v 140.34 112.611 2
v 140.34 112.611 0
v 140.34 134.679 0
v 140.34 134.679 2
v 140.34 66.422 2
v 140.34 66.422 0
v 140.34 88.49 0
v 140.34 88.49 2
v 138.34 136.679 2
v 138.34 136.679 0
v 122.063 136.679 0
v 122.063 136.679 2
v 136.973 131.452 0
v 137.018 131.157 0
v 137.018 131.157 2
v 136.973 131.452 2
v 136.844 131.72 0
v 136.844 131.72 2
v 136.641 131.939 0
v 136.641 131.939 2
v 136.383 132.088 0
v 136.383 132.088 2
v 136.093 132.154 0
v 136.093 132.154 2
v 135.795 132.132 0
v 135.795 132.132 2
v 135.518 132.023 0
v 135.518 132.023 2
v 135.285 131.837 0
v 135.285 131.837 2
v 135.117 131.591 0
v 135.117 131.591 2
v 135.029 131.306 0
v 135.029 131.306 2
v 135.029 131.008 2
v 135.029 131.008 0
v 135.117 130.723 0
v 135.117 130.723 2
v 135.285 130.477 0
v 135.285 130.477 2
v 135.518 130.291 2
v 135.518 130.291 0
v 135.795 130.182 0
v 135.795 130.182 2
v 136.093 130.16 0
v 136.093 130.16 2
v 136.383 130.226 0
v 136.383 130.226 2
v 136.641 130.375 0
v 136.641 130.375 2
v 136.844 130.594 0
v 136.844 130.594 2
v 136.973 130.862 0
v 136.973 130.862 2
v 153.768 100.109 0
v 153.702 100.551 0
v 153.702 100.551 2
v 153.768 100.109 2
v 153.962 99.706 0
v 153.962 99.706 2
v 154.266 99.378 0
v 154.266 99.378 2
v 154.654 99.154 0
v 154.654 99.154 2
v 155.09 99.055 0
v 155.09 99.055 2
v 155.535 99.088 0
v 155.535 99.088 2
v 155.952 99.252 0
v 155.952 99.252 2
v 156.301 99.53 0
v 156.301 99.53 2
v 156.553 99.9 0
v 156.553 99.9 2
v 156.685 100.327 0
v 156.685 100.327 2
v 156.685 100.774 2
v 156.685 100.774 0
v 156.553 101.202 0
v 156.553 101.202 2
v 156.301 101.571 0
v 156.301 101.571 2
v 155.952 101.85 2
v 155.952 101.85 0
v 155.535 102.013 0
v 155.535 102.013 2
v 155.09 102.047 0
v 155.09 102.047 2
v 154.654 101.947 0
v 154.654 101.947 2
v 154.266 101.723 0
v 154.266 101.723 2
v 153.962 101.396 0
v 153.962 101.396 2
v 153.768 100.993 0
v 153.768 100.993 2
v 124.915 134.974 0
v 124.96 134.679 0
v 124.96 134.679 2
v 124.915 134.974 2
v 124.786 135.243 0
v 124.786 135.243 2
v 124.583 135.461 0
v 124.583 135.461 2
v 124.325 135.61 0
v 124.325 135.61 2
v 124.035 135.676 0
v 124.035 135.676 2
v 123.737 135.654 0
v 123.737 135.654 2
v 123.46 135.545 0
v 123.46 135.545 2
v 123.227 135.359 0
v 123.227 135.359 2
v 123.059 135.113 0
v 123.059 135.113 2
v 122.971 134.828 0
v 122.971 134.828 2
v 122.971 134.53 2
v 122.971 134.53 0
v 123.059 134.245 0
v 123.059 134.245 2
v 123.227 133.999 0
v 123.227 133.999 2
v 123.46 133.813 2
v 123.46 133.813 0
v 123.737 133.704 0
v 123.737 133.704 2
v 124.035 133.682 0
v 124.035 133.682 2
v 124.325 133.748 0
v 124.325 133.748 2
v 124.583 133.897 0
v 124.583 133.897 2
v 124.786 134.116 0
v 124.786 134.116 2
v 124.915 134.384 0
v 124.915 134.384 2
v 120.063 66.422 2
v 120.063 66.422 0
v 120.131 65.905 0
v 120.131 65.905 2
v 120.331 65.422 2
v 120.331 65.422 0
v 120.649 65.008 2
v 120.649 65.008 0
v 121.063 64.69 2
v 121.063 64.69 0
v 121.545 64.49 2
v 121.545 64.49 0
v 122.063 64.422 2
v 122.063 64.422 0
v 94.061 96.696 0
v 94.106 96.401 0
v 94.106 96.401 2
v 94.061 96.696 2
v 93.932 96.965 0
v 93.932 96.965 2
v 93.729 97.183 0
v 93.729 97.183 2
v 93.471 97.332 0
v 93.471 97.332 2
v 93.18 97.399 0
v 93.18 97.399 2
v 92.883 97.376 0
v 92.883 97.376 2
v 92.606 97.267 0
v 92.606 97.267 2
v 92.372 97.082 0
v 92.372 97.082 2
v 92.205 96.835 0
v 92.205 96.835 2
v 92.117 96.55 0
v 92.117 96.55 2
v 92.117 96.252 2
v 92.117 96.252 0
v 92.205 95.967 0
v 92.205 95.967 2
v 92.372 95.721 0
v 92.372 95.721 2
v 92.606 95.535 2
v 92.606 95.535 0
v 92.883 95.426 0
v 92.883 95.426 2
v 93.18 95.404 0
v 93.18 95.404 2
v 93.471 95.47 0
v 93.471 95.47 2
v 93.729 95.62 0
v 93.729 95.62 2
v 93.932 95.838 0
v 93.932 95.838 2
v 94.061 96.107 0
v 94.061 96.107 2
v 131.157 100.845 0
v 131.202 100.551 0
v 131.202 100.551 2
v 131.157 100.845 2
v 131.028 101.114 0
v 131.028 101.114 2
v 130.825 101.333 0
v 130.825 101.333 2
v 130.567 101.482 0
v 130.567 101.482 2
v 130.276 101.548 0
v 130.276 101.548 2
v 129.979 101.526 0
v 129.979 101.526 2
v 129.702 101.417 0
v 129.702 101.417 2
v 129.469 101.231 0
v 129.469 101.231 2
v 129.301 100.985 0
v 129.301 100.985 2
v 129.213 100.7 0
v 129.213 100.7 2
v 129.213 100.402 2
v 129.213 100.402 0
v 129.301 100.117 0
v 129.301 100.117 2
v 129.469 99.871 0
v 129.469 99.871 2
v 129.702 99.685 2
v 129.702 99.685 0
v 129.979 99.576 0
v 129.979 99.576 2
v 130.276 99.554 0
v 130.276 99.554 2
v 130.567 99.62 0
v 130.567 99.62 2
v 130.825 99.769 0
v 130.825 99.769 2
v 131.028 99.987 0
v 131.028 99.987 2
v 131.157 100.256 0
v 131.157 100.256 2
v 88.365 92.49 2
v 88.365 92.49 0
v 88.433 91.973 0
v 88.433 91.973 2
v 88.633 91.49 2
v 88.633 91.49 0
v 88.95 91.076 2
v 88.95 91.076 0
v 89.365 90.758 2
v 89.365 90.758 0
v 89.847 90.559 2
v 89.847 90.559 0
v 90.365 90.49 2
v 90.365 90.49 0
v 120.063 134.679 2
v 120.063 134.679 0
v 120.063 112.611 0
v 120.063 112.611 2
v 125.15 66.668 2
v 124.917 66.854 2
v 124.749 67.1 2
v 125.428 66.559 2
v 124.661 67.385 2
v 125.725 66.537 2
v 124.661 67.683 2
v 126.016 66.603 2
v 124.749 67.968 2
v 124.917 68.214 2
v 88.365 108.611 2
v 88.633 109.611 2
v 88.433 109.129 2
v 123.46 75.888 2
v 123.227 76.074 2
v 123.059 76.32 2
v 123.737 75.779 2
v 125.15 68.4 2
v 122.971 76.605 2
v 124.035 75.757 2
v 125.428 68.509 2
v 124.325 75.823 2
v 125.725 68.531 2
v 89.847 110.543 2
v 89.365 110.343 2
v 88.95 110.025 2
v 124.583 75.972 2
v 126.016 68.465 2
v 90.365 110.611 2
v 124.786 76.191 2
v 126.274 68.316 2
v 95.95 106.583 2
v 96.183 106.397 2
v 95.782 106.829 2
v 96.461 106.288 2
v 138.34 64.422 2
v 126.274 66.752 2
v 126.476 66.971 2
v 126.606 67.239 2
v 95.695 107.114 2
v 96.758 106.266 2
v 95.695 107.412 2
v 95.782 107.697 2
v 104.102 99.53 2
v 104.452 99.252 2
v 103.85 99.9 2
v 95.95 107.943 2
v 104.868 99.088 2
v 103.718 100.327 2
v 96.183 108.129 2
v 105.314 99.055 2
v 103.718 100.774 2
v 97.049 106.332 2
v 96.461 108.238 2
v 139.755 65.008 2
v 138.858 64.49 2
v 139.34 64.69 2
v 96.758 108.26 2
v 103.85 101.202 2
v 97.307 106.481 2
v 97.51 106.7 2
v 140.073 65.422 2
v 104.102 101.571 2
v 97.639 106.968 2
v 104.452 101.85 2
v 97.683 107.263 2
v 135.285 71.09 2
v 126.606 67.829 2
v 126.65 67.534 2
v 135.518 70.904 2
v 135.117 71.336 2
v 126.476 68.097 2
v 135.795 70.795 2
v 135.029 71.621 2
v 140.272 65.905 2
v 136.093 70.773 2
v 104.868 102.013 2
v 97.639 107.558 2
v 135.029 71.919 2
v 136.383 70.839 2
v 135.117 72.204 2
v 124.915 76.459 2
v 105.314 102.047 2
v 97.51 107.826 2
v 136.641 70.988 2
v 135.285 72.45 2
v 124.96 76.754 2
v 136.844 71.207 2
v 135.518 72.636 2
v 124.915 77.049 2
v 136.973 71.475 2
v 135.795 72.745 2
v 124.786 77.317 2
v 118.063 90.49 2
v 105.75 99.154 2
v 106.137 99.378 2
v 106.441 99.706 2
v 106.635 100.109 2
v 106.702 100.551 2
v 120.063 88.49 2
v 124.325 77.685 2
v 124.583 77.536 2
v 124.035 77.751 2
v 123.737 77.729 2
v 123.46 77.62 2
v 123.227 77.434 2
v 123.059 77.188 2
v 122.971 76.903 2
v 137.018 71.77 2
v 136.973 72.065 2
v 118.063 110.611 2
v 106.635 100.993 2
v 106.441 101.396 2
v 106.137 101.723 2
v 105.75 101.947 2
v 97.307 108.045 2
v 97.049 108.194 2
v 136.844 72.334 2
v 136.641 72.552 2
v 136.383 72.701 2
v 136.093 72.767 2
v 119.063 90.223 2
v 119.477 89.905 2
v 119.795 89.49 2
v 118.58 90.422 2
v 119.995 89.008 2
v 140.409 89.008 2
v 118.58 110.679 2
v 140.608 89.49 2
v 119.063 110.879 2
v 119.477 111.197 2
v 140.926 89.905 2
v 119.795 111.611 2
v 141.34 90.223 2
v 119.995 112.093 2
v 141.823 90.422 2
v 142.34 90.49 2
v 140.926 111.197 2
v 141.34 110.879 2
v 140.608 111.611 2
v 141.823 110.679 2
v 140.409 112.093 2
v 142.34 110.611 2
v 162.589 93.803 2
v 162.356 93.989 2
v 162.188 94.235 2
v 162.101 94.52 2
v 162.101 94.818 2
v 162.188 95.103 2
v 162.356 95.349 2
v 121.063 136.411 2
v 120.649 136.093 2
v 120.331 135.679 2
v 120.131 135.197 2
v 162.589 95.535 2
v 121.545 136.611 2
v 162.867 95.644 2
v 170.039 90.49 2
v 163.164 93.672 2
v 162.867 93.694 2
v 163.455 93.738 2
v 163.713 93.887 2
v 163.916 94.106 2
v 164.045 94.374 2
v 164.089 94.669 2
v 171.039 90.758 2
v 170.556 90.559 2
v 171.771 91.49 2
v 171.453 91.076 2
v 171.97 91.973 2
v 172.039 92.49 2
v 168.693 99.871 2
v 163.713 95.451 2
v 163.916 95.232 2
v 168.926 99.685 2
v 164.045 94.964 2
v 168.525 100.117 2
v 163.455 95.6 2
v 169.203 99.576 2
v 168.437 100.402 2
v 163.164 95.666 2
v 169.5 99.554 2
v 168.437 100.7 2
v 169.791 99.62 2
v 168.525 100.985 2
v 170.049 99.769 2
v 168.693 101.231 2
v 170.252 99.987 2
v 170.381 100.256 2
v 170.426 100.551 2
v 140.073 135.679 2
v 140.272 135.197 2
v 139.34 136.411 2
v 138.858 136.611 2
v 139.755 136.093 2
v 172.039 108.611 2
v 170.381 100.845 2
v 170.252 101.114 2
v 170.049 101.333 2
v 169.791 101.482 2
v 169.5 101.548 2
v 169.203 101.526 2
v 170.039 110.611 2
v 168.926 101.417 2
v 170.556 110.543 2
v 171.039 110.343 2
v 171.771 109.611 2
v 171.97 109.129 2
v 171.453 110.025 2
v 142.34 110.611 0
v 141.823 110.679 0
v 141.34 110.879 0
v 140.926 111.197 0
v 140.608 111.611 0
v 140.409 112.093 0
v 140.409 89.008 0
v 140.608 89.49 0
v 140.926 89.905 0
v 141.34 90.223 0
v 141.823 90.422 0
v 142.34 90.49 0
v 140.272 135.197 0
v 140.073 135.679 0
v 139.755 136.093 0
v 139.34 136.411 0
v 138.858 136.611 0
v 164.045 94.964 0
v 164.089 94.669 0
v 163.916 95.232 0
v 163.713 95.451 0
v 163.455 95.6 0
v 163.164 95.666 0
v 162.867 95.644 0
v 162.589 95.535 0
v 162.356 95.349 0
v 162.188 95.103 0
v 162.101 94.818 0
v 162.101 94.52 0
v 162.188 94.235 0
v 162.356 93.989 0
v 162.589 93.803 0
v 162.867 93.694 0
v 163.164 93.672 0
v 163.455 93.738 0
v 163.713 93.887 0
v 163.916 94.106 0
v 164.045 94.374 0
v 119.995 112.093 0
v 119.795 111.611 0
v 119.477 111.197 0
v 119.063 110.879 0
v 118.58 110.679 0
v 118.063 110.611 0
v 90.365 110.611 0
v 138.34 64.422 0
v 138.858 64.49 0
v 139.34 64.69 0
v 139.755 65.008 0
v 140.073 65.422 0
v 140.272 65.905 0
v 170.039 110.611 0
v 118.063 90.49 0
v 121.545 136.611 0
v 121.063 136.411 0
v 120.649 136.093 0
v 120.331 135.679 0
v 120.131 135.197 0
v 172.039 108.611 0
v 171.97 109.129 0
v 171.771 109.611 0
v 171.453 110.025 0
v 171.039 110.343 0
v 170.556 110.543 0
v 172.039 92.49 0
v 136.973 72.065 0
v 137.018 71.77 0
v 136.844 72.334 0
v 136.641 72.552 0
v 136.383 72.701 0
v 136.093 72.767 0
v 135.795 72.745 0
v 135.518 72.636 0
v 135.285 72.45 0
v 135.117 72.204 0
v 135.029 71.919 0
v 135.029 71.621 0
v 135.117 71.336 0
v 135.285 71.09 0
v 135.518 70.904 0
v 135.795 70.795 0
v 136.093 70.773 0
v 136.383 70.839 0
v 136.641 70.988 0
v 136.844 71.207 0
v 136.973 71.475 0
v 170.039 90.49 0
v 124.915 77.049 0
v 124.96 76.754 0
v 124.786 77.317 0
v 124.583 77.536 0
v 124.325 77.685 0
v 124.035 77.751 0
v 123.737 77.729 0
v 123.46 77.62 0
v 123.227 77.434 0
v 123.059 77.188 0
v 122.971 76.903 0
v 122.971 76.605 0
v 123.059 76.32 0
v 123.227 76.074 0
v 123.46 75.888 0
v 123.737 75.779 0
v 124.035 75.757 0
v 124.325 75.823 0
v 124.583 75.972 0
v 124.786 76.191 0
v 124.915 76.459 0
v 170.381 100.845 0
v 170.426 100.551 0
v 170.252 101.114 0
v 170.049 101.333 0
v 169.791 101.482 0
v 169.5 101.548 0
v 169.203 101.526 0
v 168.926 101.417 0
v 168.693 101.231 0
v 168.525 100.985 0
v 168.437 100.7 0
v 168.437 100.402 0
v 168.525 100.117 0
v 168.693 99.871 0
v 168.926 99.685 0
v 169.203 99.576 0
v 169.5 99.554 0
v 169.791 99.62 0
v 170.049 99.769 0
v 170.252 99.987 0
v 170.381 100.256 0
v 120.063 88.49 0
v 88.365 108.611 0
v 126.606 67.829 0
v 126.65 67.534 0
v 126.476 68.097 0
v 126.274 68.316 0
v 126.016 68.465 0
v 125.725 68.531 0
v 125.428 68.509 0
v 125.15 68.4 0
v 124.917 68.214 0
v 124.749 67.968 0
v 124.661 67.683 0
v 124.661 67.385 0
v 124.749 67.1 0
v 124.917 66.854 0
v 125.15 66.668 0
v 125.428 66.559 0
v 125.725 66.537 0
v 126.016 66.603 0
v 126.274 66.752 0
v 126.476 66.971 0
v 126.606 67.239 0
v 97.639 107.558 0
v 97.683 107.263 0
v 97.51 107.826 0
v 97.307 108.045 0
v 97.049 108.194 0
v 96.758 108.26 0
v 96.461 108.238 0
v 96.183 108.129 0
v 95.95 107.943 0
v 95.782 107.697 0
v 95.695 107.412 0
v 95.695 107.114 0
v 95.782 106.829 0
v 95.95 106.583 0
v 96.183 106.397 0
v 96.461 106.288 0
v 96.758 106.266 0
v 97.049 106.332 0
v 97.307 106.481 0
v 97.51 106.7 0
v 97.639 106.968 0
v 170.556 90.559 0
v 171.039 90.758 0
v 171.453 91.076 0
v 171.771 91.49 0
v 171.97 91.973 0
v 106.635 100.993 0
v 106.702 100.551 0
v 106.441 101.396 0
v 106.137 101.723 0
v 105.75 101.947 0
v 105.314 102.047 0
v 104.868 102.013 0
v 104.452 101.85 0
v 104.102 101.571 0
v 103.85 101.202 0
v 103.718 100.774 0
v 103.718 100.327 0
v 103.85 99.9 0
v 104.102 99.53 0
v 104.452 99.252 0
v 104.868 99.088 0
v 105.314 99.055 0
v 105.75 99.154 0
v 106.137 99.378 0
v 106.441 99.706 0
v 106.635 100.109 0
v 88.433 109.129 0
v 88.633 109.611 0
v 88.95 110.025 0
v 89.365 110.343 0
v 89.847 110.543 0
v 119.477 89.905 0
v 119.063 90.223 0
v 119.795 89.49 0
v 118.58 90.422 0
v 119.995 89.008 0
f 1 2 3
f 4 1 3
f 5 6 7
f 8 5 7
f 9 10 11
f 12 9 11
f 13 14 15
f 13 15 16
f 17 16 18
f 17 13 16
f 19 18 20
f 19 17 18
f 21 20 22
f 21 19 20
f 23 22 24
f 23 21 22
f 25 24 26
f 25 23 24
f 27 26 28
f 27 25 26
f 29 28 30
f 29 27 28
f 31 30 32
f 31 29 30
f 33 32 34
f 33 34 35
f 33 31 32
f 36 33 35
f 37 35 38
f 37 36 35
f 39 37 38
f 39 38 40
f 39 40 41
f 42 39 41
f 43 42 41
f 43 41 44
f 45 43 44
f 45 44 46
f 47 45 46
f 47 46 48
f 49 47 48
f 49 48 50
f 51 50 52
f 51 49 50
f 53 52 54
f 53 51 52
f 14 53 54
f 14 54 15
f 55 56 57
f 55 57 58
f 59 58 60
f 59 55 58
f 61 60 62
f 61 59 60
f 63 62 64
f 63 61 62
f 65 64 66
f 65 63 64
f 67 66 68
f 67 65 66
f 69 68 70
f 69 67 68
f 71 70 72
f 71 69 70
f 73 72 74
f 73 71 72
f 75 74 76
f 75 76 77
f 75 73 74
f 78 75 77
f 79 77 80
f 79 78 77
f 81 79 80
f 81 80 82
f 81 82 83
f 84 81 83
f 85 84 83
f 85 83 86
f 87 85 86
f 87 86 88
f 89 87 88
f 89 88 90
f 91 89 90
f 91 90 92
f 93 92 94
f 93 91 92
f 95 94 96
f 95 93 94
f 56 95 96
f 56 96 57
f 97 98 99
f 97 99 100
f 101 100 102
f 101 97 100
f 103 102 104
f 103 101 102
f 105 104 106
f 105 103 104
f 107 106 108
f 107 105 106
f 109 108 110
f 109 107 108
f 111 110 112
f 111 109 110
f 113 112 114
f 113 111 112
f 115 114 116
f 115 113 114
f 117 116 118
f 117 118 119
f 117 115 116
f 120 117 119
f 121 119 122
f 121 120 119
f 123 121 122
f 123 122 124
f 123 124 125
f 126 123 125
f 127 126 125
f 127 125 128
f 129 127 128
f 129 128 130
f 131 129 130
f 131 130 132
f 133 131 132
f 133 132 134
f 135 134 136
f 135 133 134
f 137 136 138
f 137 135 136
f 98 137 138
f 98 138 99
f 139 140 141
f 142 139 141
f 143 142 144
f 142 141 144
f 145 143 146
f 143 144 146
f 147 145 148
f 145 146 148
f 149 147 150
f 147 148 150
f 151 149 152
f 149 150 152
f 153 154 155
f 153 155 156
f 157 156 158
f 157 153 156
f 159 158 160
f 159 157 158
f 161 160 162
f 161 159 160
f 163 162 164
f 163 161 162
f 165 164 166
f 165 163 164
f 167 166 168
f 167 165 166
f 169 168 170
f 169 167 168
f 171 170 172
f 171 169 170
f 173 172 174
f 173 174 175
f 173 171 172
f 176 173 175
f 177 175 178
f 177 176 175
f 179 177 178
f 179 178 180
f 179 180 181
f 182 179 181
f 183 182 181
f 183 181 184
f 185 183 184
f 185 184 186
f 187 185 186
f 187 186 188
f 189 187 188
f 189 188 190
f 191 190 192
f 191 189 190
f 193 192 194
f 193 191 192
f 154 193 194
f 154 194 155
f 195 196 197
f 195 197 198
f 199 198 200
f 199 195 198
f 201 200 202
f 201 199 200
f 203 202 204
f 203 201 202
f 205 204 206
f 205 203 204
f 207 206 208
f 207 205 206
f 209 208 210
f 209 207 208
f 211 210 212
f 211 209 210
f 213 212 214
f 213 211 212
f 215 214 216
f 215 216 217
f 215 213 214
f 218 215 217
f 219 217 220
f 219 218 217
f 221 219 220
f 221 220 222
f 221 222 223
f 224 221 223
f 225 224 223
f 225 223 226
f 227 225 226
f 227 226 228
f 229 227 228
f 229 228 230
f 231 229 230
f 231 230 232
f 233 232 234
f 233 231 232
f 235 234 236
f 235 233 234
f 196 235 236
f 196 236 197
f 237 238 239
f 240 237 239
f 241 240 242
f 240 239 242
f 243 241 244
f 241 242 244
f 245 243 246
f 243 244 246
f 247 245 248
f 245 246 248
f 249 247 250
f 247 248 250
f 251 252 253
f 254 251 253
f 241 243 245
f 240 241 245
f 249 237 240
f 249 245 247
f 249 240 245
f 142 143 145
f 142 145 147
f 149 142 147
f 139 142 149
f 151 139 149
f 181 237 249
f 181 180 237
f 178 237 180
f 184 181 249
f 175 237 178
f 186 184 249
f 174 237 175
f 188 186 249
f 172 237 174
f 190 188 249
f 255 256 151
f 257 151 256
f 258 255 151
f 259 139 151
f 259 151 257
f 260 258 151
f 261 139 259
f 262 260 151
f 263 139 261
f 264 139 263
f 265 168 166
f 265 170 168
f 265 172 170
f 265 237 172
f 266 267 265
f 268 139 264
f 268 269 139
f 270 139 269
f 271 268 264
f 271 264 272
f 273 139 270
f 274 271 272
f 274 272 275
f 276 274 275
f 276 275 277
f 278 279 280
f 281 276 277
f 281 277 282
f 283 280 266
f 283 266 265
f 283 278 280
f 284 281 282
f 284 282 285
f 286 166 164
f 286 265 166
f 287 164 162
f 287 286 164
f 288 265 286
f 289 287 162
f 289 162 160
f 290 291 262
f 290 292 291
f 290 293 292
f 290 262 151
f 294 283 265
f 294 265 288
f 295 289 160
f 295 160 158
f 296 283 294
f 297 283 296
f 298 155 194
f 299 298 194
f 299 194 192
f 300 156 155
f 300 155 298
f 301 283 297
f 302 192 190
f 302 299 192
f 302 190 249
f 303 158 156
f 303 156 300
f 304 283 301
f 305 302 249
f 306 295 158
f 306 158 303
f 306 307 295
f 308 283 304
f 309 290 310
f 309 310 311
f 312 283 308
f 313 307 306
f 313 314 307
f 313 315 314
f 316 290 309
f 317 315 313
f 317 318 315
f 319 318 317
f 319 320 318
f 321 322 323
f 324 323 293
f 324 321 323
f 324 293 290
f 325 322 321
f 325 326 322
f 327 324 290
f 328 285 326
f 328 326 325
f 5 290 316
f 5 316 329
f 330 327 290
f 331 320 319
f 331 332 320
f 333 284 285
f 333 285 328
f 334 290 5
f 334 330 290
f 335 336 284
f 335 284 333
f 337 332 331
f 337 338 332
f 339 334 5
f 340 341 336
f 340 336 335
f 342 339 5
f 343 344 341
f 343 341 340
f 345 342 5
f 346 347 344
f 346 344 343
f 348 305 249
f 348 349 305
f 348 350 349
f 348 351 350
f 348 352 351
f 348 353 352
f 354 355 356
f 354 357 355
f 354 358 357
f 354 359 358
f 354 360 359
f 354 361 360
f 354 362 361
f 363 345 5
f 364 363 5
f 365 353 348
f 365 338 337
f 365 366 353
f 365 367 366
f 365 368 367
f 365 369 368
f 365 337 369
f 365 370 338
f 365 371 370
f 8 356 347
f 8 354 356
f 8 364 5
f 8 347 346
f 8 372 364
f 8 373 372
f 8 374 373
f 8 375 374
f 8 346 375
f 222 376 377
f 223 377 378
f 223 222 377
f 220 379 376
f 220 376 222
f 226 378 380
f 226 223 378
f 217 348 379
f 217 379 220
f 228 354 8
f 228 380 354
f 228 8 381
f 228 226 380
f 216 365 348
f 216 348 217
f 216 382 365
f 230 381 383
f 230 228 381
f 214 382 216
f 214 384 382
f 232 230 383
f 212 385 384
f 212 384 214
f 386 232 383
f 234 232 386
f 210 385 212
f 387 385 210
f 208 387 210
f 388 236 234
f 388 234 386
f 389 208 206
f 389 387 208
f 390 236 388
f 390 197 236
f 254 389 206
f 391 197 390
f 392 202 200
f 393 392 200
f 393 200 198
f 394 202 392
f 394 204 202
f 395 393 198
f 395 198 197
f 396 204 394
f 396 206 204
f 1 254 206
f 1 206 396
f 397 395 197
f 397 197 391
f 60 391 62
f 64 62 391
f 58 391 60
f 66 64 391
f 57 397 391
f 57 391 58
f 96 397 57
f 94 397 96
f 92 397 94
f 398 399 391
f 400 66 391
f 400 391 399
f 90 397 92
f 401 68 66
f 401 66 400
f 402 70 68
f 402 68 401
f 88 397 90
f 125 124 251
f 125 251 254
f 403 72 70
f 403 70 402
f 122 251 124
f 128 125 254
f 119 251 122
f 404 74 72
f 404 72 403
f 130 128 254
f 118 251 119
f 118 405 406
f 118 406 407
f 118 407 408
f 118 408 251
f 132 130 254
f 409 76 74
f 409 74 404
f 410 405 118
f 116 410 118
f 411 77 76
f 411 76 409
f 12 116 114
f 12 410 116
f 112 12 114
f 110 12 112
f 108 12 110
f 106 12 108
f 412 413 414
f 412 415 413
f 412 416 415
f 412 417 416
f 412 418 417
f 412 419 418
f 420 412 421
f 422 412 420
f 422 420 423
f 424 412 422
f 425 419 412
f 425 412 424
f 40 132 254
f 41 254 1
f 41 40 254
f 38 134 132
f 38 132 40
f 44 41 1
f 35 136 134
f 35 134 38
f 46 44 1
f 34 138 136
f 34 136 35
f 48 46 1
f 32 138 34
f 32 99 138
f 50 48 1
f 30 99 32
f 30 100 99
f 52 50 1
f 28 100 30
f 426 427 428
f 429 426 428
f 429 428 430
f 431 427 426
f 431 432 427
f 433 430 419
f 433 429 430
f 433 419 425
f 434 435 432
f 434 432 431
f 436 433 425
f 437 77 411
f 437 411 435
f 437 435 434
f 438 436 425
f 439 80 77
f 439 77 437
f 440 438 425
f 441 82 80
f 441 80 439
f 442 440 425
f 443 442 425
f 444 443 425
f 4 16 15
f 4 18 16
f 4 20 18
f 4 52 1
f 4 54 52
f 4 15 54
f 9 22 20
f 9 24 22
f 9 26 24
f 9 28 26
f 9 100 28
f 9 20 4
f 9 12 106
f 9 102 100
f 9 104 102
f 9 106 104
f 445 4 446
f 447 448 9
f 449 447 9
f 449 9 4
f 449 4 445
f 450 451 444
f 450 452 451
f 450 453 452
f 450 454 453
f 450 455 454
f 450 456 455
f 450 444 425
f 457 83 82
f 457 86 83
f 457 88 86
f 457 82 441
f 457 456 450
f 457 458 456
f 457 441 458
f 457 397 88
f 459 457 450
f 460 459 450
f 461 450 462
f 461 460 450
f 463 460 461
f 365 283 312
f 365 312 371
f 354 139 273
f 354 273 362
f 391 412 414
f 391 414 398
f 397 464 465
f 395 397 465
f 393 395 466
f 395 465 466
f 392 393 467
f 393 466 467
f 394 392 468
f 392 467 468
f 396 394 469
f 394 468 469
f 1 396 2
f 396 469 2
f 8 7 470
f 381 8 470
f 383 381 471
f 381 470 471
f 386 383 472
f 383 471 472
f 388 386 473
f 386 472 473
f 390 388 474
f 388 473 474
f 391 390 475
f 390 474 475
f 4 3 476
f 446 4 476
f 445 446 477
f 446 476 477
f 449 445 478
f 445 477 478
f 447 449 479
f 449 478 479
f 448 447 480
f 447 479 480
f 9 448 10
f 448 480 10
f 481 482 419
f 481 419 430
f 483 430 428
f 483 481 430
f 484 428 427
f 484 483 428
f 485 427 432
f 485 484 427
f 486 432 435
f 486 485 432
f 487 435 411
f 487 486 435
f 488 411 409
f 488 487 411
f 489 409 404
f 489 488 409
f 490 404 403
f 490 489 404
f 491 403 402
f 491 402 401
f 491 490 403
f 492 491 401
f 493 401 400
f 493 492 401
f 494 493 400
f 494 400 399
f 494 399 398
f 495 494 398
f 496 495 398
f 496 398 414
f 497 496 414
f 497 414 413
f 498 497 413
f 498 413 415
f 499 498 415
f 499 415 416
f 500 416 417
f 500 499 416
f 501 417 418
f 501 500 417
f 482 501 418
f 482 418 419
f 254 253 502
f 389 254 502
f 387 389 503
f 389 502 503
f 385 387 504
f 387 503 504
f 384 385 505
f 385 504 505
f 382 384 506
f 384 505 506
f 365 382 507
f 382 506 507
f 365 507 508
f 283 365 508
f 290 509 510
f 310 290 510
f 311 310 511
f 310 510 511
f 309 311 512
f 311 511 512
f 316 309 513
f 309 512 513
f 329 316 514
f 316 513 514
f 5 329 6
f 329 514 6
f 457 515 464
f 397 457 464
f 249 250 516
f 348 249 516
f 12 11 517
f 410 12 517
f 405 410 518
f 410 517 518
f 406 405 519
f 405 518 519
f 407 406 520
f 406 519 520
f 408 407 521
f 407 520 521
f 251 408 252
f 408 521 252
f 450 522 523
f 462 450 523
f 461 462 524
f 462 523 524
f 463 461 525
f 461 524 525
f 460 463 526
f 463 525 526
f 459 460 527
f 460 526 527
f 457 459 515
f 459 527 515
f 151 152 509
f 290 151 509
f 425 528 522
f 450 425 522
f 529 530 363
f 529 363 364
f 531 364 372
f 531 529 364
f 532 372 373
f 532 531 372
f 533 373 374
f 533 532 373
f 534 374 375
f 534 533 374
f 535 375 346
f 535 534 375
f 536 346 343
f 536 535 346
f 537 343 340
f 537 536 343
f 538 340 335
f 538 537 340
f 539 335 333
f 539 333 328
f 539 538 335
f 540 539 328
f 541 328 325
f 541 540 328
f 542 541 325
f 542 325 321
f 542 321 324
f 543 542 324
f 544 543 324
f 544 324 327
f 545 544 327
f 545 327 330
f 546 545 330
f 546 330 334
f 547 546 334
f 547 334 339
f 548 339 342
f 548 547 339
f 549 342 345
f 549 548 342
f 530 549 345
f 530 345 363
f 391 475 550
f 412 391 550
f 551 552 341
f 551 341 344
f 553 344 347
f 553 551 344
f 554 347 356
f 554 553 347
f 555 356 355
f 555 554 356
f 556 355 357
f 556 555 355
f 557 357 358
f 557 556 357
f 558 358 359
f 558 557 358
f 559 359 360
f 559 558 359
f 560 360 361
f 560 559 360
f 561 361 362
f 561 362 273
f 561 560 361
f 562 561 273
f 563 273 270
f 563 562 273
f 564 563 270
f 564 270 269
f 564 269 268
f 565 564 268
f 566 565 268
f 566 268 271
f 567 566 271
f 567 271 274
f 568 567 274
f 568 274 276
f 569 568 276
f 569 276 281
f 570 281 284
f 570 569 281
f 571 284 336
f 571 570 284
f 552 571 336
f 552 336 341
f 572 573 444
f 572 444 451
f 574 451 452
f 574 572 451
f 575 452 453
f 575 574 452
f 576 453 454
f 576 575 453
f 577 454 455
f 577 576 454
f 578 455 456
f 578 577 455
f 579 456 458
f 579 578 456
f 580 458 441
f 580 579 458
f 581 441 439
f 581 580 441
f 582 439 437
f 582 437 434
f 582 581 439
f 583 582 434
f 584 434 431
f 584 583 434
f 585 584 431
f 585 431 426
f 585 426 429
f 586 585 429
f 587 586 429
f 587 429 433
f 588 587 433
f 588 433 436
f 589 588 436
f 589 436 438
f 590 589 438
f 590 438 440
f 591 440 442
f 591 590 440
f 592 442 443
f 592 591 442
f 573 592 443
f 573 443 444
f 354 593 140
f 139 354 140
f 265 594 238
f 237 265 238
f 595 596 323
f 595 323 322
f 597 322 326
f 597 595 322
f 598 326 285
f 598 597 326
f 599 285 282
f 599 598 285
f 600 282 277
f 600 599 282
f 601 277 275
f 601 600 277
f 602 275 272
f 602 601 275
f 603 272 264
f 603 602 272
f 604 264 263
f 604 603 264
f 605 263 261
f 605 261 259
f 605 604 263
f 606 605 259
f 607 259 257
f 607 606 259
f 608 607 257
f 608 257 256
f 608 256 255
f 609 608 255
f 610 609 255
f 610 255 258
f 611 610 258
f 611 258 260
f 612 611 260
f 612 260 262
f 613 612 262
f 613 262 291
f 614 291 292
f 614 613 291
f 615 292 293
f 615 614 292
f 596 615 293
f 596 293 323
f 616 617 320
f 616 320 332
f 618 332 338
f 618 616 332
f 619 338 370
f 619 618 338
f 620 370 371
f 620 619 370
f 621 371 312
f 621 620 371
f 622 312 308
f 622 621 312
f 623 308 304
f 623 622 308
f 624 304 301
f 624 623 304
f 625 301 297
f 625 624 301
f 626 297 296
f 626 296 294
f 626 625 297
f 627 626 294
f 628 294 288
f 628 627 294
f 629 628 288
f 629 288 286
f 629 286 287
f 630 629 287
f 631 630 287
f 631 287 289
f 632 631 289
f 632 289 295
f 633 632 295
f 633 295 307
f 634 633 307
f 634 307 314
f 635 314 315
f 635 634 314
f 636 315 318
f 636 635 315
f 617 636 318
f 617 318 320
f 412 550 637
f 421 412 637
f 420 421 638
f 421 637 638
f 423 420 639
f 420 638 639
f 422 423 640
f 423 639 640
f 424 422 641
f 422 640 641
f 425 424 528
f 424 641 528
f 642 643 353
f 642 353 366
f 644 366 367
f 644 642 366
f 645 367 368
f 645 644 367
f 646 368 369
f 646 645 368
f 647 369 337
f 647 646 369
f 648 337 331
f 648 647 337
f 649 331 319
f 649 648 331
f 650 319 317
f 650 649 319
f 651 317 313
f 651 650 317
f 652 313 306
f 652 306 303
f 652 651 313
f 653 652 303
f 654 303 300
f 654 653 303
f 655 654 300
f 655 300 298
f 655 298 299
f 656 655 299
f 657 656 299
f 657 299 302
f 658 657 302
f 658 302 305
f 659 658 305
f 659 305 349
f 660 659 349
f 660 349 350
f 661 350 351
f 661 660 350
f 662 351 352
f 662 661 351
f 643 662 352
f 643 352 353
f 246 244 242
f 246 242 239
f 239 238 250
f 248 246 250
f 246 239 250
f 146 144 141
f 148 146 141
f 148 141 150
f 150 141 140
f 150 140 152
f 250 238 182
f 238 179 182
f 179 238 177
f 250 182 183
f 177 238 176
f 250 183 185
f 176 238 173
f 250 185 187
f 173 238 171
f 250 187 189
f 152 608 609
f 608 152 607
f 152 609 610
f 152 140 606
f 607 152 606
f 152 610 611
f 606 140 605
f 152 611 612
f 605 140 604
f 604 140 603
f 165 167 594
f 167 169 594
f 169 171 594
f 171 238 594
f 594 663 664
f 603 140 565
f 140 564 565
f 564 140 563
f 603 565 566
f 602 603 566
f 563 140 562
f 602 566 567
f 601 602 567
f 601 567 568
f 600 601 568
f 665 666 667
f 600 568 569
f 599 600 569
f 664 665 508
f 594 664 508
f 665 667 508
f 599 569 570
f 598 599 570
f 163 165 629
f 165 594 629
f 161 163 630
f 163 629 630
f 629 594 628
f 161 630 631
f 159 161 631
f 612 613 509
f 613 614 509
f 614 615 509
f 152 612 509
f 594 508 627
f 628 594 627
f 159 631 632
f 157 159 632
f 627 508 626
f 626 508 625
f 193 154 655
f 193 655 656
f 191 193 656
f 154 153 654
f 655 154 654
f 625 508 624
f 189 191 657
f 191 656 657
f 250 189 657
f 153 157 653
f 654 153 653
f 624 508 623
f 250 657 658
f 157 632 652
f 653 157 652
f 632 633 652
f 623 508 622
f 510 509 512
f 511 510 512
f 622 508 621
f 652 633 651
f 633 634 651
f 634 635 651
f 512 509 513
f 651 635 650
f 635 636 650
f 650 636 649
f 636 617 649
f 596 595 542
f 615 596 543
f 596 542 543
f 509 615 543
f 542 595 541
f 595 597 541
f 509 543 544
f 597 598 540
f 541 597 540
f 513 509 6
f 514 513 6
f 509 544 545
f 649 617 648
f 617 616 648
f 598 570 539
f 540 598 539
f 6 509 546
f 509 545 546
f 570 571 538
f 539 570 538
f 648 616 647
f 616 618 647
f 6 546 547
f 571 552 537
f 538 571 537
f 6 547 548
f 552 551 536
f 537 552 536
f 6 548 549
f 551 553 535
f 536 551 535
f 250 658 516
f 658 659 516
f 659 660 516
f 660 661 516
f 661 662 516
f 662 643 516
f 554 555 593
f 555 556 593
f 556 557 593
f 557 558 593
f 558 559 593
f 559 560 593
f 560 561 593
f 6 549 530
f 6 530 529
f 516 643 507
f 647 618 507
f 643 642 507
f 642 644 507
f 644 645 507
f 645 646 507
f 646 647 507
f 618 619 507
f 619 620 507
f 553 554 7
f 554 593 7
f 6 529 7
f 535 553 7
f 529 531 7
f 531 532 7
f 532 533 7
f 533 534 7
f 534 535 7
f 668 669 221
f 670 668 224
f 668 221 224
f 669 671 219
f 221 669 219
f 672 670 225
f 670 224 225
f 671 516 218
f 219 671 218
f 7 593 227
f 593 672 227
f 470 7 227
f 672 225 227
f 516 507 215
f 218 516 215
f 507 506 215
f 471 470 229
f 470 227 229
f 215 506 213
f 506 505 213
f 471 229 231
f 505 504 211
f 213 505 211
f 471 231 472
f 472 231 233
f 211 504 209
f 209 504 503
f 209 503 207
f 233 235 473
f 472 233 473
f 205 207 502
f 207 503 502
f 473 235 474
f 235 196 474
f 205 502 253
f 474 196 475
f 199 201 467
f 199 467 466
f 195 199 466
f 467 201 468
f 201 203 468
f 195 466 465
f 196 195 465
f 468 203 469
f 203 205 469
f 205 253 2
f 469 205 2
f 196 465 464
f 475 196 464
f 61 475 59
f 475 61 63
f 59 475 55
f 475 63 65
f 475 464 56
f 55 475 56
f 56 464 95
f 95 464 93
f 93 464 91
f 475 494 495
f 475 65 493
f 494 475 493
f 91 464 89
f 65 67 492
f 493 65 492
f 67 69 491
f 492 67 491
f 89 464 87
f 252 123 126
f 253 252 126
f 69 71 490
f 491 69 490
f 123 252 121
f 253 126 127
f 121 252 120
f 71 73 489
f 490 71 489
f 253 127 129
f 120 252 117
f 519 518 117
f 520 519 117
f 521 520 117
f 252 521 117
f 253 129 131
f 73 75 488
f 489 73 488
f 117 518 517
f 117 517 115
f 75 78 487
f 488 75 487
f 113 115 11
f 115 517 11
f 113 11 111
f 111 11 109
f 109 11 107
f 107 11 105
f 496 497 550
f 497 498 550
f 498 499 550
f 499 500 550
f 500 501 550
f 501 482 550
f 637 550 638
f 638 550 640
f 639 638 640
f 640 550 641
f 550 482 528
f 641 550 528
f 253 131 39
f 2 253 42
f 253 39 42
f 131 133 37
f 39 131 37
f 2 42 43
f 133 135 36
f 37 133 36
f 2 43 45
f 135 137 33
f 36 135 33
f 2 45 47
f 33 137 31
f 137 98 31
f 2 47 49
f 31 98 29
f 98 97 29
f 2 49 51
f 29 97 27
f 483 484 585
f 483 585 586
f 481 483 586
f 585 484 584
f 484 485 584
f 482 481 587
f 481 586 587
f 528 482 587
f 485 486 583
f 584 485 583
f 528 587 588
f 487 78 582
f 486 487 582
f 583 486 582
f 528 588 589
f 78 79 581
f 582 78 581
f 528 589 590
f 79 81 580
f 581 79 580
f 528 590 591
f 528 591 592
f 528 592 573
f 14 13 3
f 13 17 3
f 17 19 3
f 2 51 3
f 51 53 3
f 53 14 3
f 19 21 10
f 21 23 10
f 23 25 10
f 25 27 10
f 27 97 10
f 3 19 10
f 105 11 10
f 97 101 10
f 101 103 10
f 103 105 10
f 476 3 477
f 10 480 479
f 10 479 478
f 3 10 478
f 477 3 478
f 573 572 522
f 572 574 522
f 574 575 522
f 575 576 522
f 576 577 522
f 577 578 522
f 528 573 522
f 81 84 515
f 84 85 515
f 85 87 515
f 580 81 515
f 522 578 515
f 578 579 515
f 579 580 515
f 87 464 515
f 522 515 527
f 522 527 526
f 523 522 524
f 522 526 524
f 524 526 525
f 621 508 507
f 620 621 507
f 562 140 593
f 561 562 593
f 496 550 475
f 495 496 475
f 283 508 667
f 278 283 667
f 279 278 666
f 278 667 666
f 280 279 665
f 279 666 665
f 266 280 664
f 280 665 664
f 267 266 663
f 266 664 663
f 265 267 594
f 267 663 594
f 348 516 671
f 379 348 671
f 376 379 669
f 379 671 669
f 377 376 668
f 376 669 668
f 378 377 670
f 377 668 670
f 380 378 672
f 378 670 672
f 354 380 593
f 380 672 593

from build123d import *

# Parameters (mm, degrees)
SKETCH_3_R      = 1.5
SKETCH_3_R_2    = 1
EXTRUDE_1_DEPTH = 2


with BuildPart() as part:
    # 草图3 → 凸台-拉伸1 (new body)
    with BuildSketch(Plane.XY):
        with BuildLine():
            Line((118.06282276, 110.61097636), (90.364678066, 110.61097636))
            ThreePointArc((90.364678066, 110.61097636), (88.950464504, 110.025189922), (88.364678066, 108.61097636))
            Line((88.364678066, 108.61097636), (88.364678066, 92.490482591))
            ThreePointArc((88.364678066, 92.490482591), (88.950464504, 91.076269028), (90.364678066, 90.490482591))
            Line((90.364678066, 90.490482591), (118.06282276, 90.490482591))
            ThreePointArc((118.06282276, 90.490482591), (119.477036322, 89.904696153), (120.06282276, 88.490482591))
            Line((120.06282276, 88.490482591), (120.06282276, 66.422251235))
            ThreePointArc((120.06282276, 66.422251235), (120.648609197, 65.008037673), (122.06282276, 64.422251235))
            Line((122.06282276, 64.422251235), (138.340493265, 64.422251235))
            ThreePointArc((138.340493265, 64.422251235), (139.754706828, 65.008037673), (140.340493265, 66.422251235))
            Line((140.340493265, 66.422251235), (140.340493265, 88.490482591))
            ThreePointArc((140.340493265, 88.490482591), (140.926279703, 89.904696153), (142.340493265, 90.490482591))
            Line((142.340493265, 90.490482591), (170.038637959, 90.490482591))
            ThreePointArc((170.038637959, 90.490482591), (171.452851521, 91.076269028), (172.038637959, 92.490482591))
            Line((172.038637959, 92.490482591), (172.038637959, 108.61097636))
            ThreePointArc((172.038637959, 108.61097636), (171.452851521, 110.025189922), (170.038637959, 110.61097636))
            Line((170.038637959, 110.61097636), (142.340493265, 110.61097636))
            ThreePointArc((142.340493265, 110.61097636), (140.926279703, 111.196762797), (140.340493265, 112.61097636))
            Line((140.340493265, 112.61097636), (140.340493265, 134.679207715))
            ThreePointArc((140.340493265, 134.679207715), (139.754706828, 136.093421277), (138.340493265, 136.679207715))
            Line((138.340493265, 136.679207715), (122.06282276, 136.679207715))
            ThreePointArc((122.06282276, 136.679207715), (120.648609197, 136.093421277), (120.06282276, 134.679207715))
            Line((120.06282276, 134.679207715), (120.06282276, 112.61097636))
            ThreePointArc((120.06282276, 112.61097636), (119.477036322, 111.196762797), (118.06282276, 110.61097636))
        make_face()
        with Locations((105.201658013, 100.550729475)):
            Circle(SKETCH_3_R, mode=Mode.SUBTRACT)
        with Locations(Location((155.201658013, 100.550729475, 0), (0, 0, 180))):
            Circle(SKETCH_3_R, mode=Mode.SUBTRACT)
        with Locations((136.017880342, 131.156826246)):
            Circle(SKETCH_3_R_2, mode=Mode.SUBTRACT)
        with Locations((123.959858439, 76.753868602)):
            Circle(SKETCH_3_R_2, mode=Mode.SUBTRACT)
        with Locations((93.105508276, 96.40135135)):
            Circle(SKETCH_3_R_2, mode=Mode.SUBTRACT)
        with Locations((169.425693967, 100.550729475)):
            Circle(SKETCH_3_R_2, mode=Mode.SUBTRACT)
        with Locations((130.201658013, 100.550729475)):
            Circle(SKETCH_3_R_2, mode=Mode.SUBTRACT)
        with Locations((125.650168223, 67.53399009)):
            Circle(SKETCH_3_R_2, mode=Mode.SUBTRACT)
        with Locations((123.959858439, 134.679207715)):
            Circle(SKETCH_3_R_2, mode=Mode.SUBTRACT)
        with Locations((96.683392317, 107.263125424)):
            Circle(SKETCH_3_R_2, mode=Mode.SUBTRACT)
        with Locations((163.089439849, 94.66887503)):
            Circle(SKETCH_3_R_2, mode=Mode.SUBTRACT)
        with Locations((136.017880342, 71.77023795)):
            Circle(SKETCH_3_R_2, mode=Mode.SUBTRACT)
    extrude(amount=EXTRUDE_1_DEPTH)


solid = part.part
